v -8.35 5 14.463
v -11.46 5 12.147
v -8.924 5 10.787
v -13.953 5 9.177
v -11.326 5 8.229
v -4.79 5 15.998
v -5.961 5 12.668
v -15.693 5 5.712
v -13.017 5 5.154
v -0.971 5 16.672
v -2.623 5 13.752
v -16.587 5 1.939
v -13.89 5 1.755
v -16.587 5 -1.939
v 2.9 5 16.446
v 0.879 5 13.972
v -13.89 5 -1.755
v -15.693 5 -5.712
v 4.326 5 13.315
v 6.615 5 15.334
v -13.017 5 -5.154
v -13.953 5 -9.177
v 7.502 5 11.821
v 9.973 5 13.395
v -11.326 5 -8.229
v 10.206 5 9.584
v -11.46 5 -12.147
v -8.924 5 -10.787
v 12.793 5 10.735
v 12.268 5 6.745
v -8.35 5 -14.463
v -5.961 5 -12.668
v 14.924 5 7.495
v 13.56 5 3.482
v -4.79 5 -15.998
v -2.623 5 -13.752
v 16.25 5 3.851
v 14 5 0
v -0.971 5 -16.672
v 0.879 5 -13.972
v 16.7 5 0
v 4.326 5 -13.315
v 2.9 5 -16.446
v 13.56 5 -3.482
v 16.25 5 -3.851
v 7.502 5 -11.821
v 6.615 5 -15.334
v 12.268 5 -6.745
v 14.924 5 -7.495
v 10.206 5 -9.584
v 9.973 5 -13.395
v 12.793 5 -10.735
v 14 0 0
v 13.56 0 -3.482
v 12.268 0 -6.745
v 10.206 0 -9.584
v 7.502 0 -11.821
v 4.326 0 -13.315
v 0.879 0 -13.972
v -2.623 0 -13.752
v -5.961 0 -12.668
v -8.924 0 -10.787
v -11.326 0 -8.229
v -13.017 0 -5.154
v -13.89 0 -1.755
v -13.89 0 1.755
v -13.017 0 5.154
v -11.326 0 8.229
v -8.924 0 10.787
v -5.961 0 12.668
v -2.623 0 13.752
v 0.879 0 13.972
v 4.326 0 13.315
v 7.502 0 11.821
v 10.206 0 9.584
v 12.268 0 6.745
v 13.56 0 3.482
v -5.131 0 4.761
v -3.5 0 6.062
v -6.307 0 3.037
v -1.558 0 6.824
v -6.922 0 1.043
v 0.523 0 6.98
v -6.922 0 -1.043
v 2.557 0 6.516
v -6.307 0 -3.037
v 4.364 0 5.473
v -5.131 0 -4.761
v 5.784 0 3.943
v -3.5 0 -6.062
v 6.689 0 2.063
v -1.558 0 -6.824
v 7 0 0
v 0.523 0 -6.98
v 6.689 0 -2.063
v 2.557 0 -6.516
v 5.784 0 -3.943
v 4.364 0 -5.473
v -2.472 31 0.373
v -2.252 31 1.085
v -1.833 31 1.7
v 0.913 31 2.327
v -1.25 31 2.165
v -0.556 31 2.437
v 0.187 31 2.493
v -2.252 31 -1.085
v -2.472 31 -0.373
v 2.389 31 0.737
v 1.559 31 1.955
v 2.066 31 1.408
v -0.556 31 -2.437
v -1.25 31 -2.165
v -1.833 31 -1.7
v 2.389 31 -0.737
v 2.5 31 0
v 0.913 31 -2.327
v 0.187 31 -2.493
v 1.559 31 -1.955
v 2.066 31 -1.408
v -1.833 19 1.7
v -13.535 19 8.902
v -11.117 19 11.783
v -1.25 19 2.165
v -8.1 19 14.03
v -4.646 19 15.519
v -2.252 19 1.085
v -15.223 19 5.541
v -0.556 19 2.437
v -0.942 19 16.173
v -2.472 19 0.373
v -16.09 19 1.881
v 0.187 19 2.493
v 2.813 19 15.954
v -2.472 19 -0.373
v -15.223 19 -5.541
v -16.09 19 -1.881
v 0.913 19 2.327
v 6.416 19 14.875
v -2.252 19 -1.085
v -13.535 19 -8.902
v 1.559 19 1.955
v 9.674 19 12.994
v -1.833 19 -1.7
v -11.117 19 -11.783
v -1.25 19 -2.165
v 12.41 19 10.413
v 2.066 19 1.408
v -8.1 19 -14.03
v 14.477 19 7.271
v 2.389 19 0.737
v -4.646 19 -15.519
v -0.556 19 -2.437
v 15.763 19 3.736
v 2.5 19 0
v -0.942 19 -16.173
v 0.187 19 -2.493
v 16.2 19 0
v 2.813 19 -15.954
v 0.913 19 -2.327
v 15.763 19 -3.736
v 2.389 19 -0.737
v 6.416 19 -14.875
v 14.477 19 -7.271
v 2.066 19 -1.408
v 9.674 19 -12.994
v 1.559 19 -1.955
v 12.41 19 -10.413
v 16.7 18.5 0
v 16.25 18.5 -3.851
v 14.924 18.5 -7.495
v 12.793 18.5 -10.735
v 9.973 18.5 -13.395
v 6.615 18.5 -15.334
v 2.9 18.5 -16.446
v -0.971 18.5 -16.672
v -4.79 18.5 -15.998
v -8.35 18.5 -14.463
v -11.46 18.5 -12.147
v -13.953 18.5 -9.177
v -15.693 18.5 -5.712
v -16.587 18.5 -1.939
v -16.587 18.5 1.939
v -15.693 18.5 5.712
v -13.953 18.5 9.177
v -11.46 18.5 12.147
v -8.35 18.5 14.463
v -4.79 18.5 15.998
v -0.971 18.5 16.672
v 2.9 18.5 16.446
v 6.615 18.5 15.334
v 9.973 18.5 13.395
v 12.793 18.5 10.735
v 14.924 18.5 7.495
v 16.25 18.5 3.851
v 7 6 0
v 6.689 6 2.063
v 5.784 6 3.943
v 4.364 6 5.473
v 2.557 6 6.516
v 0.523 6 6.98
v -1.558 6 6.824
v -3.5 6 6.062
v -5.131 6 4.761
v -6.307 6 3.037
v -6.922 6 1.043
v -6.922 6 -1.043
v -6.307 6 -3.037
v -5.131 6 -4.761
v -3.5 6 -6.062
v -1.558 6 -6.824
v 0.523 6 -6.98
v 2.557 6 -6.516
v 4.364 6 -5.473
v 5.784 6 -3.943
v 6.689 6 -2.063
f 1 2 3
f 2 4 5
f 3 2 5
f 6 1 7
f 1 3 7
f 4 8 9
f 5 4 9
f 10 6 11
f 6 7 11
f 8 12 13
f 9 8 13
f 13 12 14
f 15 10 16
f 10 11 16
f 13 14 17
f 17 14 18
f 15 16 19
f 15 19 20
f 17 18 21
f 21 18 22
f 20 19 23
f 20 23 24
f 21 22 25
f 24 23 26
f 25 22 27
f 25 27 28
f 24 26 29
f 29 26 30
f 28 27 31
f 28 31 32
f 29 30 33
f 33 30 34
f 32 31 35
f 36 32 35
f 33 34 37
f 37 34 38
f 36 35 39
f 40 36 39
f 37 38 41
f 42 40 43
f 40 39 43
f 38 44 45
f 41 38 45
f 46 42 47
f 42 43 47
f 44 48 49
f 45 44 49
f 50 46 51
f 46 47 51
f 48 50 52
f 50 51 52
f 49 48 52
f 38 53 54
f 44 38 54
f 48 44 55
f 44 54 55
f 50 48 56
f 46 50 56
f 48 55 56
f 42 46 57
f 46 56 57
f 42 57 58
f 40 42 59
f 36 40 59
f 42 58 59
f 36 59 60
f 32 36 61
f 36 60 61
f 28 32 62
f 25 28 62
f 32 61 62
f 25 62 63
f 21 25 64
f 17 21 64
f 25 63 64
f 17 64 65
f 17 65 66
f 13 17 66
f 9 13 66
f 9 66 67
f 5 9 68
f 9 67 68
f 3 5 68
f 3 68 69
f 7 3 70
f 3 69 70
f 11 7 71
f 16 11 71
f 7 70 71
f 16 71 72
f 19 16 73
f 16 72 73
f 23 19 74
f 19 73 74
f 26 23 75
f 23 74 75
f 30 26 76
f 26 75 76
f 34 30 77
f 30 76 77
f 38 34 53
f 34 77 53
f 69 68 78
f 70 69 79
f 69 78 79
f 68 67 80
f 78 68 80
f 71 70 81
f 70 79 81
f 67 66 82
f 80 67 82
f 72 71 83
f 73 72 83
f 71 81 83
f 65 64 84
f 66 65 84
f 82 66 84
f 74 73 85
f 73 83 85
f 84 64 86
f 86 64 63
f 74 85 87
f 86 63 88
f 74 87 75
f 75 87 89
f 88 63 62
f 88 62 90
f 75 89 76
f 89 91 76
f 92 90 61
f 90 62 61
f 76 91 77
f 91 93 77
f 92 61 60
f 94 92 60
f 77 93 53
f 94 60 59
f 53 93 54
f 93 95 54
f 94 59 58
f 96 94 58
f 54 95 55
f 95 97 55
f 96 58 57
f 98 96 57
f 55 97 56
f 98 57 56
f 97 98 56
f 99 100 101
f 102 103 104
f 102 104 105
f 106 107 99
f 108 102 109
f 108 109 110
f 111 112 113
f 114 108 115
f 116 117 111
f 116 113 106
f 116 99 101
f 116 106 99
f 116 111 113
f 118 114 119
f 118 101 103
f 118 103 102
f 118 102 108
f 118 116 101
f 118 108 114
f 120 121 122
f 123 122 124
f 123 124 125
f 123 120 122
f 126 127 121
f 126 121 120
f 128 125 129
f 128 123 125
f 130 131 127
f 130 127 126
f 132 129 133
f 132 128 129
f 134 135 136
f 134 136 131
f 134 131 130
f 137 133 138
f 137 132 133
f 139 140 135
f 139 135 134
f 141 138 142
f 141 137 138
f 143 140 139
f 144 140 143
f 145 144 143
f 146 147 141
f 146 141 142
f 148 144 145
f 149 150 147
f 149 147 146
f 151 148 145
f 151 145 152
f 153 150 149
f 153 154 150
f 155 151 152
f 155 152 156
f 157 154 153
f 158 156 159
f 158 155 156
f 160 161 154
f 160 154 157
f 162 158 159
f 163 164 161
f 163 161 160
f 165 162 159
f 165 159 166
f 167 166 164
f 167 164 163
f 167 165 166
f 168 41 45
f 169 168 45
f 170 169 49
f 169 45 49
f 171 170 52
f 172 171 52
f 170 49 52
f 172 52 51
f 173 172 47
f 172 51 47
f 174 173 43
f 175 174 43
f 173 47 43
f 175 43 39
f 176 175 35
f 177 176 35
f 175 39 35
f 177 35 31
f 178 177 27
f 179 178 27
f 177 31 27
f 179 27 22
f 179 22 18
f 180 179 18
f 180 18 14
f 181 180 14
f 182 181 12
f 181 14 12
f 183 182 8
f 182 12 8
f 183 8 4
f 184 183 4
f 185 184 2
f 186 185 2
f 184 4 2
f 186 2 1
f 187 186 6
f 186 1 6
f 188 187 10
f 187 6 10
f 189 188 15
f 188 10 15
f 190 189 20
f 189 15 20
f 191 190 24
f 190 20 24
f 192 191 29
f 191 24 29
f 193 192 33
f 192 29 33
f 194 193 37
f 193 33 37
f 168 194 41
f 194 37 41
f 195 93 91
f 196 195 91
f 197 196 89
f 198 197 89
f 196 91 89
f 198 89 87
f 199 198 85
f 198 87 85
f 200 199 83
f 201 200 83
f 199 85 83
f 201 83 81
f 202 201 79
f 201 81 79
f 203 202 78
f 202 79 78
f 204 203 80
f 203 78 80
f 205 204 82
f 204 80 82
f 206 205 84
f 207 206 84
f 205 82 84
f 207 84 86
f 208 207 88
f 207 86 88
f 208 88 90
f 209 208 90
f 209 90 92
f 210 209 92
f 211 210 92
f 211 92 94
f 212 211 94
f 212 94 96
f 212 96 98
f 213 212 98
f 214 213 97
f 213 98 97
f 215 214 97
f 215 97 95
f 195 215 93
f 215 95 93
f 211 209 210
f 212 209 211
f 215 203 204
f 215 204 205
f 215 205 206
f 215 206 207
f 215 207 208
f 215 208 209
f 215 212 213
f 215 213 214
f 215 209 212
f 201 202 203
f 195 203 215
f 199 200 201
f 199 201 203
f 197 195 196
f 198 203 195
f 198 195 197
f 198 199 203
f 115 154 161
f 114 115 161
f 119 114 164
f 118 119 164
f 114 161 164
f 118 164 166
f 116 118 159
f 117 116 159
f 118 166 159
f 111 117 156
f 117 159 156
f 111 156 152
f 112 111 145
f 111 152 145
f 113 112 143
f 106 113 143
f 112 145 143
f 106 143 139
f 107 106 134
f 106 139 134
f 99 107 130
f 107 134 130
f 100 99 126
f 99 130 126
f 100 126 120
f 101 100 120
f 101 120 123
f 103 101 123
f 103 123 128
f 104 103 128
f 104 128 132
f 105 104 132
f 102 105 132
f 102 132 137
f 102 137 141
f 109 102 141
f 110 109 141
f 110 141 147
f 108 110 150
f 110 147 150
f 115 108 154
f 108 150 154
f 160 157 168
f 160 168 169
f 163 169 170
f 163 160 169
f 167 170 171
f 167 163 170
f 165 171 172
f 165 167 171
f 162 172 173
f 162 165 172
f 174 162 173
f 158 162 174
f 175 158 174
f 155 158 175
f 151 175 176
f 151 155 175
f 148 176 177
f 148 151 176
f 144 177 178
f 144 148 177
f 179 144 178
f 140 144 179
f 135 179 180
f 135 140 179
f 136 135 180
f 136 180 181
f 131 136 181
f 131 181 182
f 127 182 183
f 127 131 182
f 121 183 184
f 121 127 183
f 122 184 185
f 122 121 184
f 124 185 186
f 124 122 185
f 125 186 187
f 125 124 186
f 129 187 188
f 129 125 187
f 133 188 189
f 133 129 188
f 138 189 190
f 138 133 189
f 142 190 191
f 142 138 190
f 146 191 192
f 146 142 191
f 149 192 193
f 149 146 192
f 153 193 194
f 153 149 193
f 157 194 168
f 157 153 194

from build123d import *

# Parameters (mm, degrees)
SKETCH1_R           = 14
BOSS_EXTRUDE1_DEPTH = 5
SKETCH2_R           = 16.7
BOSS_EXTRUDE2_DEPTH = 14
SKETCH3_R           = 2.5
BOSS_EXTRUDE3_DEPTH = 12
CHAMFER1_SIZE       = 0.5
SKETCH4_R           = 7
CUT_EXTRUDE1_DEPTH  = 6


with BuildPart() as part:
    # Sketch1 → Boss-Extrude1 (new body)
    with BuildSketch(Plane(origin=(0, 0, 0), x_dir=(1, 0, 0), z_dir=(0, 1, 0))):
        Circle(SKETCH1_R)
    extrude(amount=BOSS_EXTRUDE1_DEPTH)

    # Sketch2 → Boss-Extrude2 (add)
    with BuildSketch(Plane(origin=(0, 5, 0), x_dir=(1, 0, 0), z_dir=(0, 1, 0))):
        Circle(SKETCH2_R)
    extrude(amount=BOSS_EXTRUDE2_DEPTH)

    # Sketch3 → Boss-Extrude3 (add)
    with BuildSketch(Plane(origin=(0, 19, 0), x_dir=(1, 0, 0), z_dir=(0, 1, 0))):
        Circle(SKETCH3_R)
    extrude(amount=BOSS_EXTRUDE3_DEPTH)

    # Chamfer1
    chamfer1_edges = [part.edges().sort_by_distance(p)[0] for p in [
        (-16.7, 19, 0),
    ]]
    chamfer(chamfer1_edges, length=CHAMFER1_SIZE)

    # Sketch4 → Cut-Extrude1 (cut)
    with BuildSketch(Plane.XZ):
        Circle(SKETCH4_R)
    extrude(amount=-CUT_EXTRUDE1_DEPTH, mode=Mode.SUBTRACT)


solid = part.part
